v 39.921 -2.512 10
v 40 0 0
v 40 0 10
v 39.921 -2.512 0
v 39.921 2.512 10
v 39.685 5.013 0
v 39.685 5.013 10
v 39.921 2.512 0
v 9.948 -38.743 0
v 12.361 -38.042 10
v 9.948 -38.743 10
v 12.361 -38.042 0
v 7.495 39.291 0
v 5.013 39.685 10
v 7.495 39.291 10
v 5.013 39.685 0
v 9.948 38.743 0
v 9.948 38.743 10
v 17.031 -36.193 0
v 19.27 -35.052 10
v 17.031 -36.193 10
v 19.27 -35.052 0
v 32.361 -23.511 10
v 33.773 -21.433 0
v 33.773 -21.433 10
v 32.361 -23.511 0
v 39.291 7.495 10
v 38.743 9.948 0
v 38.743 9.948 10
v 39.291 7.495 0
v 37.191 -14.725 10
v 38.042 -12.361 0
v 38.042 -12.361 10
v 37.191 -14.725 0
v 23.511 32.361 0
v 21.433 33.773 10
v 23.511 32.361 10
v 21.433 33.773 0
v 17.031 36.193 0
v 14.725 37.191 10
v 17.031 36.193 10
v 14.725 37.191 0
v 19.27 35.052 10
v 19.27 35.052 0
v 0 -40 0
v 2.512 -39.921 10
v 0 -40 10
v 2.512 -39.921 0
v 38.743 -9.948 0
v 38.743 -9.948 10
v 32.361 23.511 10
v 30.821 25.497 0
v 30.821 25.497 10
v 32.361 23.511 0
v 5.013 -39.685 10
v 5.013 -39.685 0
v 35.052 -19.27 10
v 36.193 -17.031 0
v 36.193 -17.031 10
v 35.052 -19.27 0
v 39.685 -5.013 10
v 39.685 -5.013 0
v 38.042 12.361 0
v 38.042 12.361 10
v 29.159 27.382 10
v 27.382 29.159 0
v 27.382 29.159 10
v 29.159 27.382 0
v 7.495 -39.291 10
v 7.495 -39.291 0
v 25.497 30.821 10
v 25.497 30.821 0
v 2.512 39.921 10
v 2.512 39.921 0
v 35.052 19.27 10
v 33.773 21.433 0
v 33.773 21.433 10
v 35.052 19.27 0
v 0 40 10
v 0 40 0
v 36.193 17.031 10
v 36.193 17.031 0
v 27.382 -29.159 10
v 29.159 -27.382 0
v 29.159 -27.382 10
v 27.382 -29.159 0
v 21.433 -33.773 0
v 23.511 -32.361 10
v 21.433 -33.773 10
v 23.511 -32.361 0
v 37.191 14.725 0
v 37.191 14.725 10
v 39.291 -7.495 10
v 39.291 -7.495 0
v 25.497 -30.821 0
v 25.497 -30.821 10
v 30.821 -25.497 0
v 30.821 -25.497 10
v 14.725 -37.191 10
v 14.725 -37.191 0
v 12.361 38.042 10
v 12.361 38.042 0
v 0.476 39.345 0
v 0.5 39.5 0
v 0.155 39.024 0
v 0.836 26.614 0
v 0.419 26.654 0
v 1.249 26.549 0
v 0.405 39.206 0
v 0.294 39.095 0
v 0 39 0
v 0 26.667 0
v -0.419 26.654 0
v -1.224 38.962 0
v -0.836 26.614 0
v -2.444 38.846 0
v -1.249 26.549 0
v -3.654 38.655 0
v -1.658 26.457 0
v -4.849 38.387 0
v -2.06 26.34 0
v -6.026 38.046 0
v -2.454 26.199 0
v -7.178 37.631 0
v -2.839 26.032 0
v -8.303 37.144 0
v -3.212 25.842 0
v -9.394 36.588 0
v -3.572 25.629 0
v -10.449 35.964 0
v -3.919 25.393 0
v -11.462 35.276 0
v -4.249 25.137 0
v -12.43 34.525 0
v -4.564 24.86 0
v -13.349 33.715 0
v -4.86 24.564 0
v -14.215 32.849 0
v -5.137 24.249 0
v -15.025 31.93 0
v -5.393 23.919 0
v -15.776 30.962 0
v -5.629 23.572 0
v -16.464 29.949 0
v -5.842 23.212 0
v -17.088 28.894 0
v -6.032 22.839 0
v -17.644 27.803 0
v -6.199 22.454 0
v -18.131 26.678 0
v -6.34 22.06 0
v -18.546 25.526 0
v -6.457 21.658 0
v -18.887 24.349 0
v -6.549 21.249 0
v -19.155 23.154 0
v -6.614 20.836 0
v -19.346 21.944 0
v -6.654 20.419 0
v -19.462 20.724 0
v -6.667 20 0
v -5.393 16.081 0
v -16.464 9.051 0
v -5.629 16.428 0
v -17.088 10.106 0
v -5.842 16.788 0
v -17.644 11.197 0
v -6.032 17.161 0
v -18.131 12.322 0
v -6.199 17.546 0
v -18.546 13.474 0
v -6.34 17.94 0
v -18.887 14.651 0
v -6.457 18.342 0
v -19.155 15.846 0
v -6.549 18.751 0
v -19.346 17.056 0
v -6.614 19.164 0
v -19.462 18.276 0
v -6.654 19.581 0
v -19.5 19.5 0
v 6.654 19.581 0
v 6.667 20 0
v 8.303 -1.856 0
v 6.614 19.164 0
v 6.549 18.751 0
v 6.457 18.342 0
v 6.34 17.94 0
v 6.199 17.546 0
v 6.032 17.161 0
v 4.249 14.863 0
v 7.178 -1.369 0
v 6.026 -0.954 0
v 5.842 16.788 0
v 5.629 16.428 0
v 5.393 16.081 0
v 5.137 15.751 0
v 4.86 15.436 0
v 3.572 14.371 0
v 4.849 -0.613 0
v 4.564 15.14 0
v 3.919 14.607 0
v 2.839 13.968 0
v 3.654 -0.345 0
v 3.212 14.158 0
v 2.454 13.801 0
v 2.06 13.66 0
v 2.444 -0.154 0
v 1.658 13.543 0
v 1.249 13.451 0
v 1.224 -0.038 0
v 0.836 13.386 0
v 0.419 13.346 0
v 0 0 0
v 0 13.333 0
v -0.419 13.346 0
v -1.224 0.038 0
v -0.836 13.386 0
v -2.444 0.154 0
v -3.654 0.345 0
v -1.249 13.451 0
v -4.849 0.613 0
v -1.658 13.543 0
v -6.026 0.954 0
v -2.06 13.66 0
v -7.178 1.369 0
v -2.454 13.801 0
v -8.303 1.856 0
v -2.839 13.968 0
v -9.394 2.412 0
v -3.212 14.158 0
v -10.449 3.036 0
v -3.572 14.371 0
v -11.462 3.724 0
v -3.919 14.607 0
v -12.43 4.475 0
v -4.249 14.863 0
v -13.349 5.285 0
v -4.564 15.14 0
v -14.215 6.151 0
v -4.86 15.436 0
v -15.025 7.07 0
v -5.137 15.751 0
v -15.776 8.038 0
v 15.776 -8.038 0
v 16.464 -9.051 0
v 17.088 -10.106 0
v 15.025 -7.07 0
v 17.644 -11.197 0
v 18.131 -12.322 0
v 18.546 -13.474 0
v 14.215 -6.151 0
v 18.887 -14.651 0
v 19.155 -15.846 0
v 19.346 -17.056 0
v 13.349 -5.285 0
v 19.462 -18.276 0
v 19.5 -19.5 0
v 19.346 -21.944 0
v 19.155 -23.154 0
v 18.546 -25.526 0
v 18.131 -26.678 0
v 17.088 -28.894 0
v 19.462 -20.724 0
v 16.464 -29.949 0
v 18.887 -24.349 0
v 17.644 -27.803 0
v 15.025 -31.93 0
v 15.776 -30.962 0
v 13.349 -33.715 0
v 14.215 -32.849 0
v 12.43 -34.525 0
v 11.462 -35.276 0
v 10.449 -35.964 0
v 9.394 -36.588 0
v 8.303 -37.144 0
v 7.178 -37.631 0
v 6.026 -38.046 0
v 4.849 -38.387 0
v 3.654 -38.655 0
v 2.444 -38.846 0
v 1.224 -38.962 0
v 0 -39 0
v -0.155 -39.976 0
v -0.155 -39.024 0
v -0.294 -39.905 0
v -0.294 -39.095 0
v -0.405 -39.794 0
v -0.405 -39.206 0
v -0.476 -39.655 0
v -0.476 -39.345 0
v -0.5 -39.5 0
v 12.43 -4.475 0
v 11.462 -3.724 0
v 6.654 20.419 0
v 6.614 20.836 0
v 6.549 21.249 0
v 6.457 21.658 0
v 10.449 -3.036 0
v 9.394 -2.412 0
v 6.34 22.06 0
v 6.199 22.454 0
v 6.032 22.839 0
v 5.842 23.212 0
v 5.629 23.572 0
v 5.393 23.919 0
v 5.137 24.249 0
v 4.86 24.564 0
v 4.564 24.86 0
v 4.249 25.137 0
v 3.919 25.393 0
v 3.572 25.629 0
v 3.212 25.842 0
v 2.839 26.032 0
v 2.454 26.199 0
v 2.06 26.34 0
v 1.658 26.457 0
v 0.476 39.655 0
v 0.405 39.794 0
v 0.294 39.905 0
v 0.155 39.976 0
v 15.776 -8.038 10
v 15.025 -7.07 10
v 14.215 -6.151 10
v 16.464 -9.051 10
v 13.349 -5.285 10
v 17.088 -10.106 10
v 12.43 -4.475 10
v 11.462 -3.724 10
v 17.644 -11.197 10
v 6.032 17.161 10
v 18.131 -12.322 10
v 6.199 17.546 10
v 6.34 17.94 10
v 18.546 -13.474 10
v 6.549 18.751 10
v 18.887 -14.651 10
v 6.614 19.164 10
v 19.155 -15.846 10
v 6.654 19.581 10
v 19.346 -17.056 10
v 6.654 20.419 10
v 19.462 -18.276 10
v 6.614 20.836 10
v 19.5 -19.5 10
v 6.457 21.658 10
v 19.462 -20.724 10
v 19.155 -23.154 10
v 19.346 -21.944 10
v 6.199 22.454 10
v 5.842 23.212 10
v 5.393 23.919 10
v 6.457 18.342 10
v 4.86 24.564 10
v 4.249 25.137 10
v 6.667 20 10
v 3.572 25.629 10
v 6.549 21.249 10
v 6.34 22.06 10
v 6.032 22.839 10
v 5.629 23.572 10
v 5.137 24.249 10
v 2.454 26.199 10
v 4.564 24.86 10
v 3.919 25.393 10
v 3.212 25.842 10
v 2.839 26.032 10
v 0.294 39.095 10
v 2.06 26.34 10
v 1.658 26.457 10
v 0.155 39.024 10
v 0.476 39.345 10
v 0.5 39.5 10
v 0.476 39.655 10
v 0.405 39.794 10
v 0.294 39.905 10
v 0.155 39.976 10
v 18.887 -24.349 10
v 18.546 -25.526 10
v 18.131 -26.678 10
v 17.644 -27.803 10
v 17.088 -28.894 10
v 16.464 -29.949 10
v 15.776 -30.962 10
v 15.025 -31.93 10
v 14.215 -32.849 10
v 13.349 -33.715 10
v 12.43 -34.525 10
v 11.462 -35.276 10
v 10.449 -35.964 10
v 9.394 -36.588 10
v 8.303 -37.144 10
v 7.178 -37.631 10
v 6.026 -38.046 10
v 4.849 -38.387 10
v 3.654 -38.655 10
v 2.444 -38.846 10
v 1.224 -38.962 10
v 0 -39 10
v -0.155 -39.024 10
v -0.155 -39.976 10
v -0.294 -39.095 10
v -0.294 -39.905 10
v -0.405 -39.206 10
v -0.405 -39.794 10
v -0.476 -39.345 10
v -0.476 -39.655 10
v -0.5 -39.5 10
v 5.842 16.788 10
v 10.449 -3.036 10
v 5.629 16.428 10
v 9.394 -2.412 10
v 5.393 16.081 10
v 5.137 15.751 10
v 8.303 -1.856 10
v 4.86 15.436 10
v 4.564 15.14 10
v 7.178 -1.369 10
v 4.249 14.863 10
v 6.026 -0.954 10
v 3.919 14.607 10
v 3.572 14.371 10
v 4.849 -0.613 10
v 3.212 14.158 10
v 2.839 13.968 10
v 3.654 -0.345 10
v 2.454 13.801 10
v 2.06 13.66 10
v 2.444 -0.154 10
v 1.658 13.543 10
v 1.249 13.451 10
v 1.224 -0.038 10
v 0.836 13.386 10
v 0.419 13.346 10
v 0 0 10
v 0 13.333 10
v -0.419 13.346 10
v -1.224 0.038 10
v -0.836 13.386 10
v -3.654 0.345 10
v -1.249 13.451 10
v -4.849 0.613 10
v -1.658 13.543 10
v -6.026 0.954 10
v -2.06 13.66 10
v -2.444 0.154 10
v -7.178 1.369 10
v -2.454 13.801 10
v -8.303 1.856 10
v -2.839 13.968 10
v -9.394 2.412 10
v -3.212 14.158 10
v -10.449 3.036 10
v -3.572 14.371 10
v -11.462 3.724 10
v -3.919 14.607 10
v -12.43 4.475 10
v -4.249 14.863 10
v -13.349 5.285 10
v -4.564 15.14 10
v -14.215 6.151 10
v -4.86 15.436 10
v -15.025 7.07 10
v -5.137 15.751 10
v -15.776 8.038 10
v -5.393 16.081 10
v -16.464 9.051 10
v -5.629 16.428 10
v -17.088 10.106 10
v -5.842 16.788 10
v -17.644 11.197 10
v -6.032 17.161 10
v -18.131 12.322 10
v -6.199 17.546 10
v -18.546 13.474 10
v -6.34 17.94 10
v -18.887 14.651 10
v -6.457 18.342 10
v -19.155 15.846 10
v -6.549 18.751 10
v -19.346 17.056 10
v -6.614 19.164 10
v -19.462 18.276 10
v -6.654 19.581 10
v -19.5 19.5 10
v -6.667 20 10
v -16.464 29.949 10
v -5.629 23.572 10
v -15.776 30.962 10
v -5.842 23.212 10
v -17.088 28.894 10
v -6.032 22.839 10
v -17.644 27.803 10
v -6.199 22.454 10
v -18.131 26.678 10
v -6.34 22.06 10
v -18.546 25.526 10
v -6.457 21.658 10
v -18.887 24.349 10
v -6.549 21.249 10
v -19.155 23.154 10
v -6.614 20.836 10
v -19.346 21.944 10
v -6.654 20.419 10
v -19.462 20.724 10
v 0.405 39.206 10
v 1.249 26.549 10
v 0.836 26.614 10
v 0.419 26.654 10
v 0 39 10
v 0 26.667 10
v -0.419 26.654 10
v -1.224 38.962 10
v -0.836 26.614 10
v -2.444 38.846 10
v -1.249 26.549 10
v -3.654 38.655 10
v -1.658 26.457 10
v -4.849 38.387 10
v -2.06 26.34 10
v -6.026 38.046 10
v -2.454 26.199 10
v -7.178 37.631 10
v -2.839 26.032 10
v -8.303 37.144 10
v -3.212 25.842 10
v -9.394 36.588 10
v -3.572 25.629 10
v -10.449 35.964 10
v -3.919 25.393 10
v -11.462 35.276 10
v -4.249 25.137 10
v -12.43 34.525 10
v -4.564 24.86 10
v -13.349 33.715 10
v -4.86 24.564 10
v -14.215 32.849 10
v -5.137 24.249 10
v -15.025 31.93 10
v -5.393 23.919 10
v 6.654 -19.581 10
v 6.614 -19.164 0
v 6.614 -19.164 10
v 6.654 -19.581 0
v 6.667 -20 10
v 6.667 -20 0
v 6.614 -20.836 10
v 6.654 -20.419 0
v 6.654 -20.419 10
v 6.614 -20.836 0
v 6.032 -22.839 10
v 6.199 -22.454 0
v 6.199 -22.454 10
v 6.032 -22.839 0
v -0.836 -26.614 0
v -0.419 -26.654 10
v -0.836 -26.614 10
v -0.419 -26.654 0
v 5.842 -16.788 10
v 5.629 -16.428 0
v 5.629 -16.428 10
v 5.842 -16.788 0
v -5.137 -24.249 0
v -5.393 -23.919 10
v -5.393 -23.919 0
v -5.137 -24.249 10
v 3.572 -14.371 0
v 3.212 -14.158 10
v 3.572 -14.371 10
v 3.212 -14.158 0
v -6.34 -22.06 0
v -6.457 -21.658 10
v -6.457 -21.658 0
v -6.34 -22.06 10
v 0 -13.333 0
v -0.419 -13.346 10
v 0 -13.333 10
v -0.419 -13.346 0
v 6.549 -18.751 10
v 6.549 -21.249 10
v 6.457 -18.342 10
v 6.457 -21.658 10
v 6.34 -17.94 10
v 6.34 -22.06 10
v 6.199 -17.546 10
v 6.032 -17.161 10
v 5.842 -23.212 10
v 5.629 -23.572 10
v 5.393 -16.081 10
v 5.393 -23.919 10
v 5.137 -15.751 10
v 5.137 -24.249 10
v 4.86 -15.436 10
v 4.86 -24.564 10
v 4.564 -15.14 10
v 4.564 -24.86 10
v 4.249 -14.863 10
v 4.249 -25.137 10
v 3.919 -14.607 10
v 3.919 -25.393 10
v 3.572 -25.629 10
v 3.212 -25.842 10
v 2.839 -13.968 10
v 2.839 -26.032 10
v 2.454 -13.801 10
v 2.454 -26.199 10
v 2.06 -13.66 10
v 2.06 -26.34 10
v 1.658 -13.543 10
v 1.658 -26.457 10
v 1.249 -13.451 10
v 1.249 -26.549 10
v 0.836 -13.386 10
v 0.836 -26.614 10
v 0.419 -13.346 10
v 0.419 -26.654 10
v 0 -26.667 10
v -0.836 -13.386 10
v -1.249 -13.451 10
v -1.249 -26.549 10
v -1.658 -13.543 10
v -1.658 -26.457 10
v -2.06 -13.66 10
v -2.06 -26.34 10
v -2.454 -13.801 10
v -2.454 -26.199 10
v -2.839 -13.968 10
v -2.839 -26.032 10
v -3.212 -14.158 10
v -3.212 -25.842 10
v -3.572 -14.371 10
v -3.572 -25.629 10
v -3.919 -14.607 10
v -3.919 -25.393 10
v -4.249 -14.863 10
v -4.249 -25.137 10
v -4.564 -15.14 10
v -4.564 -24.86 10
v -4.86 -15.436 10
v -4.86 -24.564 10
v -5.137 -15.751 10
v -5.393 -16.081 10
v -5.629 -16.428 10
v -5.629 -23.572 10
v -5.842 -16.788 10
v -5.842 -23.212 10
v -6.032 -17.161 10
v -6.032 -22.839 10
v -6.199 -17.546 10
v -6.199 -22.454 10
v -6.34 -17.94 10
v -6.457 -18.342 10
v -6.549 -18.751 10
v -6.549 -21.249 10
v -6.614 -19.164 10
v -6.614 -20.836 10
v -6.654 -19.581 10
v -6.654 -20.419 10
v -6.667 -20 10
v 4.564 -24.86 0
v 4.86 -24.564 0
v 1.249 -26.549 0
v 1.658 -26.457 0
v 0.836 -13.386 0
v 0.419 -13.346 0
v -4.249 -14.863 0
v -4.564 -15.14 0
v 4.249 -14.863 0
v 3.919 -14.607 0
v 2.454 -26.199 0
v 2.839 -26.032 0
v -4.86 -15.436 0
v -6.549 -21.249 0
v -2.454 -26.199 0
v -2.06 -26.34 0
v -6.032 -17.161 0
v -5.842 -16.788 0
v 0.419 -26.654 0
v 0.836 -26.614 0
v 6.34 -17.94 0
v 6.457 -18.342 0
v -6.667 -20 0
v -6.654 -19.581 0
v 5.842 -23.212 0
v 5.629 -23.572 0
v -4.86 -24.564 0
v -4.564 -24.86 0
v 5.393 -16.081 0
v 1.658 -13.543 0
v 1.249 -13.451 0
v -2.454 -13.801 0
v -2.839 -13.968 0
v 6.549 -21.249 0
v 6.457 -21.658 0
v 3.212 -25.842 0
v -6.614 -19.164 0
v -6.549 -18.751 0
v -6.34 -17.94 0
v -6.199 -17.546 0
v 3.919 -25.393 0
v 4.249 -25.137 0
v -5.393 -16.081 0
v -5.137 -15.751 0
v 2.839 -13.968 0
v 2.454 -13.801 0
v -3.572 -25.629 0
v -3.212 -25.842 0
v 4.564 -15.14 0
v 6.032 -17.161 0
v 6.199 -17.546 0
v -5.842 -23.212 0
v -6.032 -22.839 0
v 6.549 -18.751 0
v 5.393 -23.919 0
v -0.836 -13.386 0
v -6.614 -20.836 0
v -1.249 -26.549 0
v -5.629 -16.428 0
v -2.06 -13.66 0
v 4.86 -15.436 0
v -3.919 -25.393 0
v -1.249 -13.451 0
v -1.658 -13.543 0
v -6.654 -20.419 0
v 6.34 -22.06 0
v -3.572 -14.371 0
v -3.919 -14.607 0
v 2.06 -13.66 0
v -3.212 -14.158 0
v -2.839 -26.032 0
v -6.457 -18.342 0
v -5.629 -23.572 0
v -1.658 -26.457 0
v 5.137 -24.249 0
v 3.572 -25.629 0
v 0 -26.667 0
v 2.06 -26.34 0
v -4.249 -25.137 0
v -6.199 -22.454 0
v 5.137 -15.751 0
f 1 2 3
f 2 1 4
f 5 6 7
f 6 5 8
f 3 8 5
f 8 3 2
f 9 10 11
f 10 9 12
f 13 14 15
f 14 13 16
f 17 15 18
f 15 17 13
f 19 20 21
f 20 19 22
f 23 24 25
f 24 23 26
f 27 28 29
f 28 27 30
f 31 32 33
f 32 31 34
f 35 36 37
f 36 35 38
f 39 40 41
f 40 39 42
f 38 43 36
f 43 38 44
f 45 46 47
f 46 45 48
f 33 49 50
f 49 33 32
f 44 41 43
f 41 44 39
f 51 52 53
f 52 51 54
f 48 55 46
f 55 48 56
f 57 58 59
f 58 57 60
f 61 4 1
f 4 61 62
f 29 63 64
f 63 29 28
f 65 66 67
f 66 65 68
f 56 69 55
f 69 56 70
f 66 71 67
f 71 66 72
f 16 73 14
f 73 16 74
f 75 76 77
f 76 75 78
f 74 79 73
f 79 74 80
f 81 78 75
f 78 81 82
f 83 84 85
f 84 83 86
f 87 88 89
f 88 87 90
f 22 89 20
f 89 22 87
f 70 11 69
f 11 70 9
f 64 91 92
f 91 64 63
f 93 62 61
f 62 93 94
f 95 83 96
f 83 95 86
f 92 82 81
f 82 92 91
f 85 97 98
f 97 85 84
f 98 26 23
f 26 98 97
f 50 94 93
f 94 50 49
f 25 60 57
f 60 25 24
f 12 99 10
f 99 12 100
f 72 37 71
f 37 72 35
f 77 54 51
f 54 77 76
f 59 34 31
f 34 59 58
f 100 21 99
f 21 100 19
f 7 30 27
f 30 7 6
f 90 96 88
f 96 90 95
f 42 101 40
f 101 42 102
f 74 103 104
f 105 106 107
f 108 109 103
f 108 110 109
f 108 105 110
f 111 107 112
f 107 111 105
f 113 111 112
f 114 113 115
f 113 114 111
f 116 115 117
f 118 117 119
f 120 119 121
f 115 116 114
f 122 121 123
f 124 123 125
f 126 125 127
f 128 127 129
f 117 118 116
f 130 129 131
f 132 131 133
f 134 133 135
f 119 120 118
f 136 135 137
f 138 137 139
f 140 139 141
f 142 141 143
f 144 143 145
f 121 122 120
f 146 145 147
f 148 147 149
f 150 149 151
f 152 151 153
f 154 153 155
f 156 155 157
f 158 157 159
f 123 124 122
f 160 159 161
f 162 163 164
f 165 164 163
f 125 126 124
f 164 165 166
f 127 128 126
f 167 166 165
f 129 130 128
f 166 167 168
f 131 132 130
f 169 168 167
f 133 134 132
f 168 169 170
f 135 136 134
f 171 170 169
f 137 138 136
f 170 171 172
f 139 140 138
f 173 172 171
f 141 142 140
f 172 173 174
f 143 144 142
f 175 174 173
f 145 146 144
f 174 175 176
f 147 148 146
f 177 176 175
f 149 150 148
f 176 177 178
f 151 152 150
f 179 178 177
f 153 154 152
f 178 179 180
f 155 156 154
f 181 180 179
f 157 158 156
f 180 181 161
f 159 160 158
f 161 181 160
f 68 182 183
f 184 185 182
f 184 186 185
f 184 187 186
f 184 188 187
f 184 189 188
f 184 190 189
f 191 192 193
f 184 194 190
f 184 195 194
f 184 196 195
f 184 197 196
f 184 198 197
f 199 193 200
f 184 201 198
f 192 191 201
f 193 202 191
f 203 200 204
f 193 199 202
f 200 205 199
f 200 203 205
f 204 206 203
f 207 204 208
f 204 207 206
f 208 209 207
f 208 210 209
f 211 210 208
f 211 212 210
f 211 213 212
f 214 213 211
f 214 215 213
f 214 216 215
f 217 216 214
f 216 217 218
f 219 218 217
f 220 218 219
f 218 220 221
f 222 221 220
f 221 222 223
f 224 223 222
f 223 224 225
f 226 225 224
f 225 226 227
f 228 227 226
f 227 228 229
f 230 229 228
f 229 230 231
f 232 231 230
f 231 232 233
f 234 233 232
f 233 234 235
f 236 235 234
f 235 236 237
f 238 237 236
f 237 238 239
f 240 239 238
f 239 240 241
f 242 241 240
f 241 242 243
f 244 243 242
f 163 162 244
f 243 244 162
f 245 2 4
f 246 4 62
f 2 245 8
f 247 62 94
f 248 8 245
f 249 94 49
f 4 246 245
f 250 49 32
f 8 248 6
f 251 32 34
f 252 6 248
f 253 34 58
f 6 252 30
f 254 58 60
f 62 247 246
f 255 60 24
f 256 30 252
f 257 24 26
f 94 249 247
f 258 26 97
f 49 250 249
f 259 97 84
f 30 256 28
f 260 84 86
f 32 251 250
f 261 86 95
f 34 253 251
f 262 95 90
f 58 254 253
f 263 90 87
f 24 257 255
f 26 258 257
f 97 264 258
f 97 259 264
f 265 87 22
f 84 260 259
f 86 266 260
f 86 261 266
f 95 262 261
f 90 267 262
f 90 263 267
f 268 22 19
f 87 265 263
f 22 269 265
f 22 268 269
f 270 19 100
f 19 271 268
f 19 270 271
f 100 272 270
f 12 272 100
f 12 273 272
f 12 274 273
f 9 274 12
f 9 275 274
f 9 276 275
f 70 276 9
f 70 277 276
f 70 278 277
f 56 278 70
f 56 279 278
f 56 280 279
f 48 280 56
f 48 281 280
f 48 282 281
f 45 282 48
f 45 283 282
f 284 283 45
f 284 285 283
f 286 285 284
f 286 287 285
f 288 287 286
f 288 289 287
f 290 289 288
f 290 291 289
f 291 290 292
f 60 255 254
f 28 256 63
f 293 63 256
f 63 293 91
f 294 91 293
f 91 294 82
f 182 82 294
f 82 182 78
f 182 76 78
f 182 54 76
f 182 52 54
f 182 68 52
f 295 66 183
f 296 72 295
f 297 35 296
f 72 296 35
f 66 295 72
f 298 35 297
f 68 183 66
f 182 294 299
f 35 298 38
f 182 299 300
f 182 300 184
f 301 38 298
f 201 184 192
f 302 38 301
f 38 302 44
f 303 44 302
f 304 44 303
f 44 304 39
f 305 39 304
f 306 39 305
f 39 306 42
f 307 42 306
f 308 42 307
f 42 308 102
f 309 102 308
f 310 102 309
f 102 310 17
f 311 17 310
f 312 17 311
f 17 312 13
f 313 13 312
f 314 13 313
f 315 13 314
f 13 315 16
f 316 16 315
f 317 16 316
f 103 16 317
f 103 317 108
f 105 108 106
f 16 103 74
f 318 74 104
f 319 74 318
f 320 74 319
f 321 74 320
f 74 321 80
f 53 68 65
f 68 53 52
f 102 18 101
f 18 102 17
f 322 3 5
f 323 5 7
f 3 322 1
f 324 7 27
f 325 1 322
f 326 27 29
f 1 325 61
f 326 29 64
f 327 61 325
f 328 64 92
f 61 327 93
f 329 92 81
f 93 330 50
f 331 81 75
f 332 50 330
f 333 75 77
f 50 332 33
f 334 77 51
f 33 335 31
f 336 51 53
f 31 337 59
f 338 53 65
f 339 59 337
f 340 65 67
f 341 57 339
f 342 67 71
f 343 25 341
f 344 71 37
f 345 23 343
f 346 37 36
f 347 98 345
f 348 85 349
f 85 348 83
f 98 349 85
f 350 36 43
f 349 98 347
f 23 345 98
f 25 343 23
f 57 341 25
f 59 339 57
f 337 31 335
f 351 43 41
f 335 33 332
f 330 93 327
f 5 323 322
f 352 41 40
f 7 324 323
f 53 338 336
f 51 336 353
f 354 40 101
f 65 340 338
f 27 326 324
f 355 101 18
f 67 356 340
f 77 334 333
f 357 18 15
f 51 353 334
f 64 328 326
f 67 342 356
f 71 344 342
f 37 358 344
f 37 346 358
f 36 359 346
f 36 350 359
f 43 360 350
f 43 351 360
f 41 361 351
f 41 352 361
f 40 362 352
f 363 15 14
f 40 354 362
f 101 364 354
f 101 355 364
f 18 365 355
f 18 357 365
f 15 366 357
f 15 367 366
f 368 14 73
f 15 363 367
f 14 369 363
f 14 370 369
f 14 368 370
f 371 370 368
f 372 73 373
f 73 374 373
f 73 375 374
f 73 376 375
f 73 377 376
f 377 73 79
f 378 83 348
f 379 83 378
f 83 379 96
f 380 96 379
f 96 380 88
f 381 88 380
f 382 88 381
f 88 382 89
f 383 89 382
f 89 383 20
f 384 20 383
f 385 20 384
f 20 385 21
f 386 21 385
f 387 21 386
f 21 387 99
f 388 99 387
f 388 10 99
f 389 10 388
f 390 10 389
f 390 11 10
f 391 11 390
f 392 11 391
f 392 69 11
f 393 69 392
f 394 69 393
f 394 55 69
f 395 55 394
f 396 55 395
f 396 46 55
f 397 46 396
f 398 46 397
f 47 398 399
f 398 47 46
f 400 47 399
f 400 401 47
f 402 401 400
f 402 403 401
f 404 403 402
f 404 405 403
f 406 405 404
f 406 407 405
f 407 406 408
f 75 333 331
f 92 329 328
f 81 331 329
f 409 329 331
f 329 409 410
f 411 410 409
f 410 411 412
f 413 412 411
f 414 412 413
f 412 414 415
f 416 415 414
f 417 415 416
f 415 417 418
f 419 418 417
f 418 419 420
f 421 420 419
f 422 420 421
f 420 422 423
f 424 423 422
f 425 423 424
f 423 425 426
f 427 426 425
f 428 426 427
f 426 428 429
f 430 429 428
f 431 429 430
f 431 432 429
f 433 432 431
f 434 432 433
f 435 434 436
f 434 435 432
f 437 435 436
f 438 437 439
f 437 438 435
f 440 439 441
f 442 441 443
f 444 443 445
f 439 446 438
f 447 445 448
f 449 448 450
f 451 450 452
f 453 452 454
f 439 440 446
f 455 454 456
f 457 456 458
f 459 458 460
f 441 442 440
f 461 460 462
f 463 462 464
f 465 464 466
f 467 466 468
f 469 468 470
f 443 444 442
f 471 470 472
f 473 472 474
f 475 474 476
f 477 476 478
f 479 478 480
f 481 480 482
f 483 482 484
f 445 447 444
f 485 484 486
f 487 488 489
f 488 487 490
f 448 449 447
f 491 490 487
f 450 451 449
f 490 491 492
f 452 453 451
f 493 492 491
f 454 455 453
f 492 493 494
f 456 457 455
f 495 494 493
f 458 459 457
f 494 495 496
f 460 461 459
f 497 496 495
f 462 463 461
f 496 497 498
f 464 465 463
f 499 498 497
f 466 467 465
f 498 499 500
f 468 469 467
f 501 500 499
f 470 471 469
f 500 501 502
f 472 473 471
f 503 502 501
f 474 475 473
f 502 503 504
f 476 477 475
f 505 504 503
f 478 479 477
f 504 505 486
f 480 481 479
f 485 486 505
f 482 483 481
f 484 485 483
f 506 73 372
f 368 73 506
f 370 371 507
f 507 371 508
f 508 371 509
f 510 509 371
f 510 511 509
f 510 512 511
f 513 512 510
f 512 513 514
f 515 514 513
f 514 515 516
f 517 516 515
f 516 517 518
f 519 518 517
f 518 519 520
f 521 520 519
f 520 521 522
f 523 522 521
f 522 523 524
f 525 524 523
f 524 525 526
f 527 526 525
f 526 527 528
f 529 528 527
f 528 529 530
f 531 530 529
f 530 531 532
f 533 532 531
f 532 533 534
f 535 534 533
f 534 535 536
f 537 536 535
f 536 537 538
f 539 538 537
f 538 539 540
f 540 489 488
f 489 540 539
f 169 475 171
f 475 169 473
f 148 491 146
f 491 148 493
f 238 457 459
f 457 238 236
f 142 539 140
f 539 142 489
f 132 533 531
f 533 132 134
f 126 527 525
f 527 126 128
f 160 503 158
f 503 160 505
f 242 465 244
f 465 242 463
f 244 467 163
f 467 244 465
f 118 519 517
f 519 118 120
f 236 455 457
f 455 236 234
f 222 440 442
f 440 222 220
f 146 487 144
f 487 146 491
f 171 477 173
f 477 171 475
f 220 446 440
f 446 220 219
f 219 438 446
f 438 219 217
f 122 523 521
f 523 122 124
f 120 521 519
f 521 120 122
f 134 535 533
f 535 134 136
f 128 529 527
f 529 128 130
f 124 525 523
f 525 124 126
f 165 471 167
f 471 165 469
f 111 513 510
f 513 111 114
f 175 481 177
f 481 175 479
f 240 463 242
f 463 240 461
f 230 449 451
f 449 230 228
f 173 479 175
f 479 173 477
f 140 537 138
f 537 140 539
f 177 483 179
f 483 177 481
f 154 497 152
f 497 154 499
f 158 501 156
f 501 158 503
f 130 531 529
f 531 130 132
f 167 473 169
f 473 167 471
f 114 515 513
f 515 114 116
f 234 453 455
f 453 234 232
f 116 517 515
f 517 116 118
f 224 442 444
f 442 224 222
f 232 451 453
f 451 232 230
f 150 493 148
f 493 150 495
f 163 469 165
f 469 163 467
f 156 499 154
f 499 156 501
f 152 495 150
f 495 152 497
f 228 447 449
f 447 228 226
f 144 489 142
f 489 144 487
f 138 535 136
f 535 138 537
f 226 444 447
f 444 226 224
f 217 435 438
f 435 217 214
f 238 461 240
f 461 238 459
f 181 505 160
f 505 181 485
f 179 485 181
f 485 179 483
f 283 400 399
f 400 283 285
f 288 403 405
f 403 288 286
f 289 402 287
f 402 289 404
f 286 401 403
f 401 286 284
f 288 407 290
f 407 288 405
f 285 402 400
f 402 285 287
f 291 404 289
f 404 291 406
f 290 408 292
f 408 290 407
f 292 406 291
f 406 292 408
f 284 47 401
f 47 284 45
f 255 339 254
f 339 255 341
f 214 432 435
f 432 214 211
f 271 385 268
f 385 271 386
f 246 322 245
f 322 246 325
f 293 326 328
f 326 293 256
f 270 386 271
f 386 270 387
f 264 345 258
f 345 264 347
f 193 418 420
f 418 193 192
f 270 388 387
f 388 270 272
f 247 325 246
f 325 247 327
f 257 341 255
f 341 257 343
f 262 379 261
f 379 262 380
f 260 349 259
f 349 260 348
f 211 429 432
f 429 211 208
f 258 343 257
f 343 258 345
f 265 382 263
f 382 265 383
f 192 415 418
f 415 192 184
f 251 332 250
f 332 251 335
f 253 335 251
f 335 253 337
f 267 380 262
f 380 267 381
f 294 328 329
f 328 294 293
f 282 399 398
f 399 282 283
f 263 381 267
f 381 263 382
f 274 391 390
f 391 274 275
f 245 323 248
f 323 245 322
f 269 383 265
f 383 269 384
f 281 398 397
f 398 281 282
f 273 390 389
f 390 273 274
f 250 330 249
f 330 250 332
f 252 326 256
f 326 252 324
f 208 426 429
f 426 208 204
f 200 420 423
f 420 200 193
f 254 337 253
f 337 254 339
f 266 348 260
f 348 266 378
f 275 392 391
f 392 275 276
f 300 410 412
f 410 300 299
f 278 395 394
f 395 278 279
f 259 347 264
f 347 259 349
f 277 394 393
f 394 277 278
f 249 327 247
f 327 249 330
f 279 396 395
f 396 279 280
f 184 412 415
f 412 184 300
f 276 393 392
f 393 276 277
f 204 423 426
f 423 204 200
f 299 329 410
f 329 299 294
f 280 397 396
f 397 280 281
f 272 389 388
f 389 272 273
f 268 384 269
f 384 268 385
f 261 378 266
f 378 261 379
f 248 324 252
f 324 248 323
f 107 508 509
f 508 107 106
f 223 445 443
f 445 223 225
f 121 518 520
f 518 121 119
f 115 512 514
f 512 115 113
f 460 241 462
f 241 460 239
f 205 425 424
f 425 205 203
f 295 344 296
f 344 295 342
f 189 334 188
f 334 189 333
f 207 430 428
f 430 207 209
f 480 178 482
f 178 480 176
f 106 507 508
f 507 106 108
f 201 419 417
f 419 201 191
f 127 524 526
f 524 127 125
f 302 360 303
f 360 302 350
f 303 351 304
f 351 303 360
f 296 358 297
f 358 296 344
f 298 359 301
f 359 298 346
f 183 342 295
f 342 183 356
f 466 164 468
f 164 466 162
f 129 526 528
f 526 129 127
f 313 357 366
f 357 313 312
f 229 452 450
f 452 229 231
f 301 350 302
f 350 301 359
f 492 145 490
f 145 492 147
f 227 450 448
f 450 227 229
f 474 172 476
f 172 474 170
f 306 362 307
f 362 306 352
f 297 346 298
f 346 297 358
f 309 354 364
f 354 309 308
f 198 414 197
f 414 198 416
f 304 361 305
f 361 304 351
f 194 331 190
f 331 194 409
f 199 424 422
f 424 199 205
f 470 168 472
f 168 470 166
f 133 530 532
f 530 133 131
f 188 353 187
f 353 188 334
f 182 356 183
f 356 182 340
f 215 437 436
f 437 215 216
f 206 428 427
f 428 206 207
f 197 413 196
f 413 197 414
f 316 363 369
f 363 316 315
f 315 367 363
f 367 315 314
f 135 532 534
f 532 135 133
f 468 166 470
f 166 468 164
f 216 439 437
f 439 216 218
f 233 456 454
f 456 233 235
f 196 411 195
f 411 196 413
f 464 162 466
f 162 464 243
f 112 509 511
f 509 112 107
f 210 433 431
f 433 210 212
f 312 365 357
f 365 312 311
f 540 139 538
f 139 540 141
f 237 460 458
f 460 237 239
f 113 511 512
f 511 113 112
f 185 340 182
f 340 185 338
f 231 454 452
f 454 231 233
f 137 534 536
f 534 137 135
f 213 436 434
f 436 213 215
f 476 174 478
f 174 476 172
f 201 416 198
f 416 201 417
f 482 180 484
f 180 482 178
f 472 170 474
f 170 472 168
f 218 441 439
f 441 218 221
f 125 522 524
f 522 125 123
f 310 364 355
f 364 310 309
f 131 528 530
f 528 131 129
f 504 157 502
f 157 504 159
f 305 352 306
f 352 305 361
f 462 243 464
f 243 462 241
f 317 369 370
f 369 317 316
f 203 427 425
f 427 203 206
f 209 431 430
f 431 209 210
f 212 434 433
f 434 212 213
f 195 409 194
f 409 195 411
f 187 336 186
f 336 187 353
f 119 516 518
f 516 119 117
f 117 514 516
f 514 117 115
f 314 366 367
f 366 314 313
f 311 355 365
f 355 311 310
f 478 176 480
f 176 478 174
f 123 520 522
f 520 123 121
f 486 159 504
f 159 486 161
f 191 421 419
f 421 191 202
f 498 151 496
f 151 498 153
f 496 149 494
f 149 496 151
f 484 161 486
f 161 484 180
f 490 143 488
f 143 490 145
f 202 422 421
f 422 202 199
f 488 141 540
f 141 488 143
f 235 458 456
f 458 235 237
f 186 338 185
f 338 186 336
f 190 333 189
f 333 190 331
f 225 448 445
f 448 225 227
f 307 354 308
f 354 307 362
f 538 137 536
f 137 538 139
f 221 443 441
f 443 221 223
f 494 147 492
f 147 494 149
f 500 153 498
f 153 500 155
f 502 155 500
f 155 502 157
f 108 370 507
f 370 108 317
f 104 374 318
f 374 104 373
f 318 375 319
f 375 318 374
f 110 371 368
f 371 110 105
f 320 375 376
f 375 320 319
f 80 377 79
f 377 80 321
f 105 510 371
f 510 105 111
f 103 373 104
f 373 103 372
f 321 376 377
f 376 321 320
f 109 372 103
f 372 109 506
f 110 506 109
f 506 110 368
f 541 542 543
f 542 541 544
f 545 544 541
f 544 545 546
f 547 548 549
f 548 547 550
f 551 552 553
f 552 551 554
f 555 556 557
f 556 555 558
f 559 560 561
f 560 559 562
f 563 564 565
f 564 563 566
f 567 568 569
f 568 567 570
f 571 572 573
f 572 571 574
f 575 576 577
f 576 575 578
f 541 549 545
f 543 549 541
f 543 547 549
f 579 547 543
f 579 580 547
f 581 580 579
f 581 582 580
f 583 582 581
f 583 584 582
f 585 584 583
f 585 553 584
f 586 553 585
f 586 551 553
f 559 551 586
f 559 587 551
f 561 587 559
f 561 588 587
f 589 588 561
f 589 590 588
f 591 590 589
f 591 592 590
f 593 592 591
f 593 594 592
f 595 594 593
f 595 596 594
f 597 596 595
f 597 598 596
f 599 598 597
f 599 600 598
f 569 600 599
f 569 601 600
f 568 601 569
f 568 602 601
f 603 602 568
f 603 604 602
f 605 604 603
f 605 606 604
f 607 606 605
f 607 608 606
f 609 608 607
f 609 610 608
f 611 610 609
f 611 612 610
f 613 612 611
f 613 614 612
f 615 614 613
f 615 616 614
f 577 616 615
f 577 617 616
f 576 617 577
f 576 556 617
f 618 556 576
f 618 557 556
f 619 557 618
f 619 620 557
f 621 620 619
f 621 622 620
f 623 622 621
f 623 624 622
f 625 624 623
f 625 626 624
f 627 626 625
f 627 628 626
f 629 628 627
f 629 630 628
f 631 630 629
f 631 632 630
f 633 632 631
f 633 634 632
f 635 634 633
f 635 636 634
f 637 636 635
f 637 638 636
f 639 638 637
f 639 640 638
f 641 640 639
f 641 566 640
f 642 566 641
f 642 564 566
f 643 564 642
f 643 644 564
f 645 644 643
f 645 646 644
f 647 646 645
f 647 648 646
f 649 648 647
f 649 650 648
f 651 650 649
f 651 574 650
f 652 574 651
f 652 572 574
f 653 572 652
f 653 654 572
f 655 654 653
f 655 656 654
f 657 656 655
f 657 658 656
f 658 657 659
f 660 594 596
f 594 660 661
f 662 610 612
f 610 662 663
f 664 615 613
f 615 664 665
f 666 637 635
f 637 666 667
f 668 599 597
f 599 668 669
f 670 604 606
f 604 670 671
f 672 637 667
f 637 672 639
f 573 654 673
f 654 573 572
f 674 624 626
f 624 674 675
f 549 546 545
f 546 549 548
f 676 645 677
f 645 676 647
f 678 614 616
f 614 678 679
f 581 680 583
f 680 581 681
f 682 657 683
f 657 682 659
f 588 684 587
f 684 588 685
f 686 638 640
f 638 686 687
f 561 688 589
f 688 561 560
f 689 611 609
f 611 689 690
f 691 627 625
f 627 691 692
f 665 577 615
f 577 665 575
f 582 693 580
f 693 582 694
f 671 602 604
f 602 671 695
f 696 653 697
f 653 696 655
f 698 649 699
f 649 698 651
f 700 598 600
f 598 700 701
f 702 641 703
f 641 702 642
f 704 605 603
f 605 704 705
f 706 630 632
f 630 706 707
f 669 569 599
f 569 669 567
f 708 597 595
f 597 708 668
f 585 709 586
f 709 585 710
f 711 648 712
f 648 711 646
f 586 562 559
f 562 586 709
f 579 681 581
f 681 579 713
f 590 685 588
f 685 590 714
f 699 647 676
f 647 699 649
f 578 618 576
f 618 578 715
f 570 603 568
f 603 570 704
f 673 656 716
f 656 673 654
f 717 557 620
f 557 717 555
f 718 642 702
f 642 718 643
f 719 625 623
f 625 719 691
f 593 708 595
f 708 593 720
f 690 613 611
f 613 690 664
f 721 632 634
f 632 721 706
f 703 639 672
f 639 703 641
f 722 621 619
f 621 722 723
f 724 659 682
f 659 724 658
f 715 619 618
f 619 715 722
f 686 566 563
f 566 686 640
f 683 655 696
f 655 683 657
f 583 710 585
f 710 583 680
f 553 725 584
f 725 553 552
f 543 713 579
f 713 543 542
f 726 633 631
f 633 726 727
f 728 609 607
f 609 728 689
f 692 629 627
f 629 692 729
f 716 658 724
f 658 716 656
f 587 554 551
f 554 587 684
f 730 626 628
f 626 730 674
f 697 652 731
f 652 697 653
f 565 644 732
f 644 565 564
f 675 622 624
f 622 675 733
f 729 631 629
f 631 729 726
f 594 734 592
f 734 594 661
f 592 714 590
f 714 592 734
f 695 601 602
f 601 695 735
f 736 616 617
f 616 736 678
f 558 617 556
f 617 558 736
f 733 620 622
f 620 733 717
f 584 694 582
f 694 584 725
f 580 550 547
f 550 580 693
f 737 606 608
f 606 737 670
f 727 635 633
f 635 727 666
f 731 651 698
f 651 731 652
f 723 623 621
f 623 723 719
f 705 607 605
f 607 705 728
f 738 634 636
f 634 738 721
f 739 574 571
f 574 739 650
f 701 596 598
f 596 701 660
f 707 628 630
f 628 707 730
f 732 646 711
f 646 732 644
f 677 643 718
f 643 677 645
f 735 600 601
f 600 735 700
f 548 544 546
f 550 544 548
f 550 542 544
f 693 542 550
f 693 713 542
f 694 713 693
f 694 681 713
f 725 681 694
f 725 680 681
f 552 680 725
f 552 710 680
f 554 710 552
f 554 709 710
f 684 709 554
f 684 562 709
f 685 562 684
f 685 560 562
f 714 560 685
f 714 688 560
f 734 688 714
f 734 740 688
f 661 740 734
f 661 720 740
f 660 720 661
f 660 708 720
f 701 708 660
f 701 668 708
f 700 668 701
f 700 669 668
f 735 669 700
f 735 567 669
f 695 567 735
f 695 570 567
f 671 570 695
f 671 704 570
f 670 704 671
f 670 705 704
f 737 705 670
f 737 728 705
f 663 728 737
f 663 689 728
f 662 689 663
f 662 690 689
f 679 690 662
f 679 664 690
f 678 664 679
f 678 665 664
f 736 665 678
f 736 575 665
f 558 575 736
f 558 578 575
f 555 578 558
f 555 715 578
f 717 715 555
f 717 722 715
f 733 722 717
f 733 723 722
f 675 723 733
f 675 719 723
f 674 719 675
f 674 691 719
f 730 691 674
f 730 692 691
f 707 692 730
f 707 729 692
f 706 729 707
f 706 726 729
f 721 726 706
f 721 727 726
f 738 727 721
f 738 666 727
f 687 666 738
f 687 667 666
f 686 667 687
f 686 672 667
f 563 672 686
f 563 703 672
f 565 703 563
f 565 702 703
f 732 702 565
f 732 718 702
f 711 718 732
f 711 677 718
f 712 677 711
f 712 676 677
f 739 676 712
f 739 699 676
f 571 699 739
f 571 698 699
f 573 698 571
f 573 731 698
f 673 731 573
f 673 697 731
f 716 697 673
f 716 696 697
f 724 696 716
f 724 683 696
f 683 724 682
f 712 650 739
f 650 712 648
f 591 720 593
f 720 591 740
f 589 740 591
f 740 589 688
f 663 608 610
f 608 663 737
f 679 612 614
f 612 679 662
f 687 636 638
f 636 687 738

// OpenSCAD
module _yingyang() {
    d = 80;
    h = 10;
    difference() {
        union() {
            intersection() {
                cylinder(d=d,h=h,$fn=100);
                translate([0,-100,0]) cube([100,200,11]);
            }
            translate([0,d/4-1/2,0]) cylinder(d=d/2-1,h=h,$fn=100);
            translate([0,-d/2+0.5]) cylinder(d=1,h=h,$fn=20);
        }
        translate([0,-d/4+1/2,-0.1]) cylinder(d=d/2-1,h=h+1,$fn=100);
        translate([0,d/4,-0.1]) cylinder(d=d/6,h=h+1,$fn=100);
        translate([0,d/2-0.5]) cylinder(d=1,h=h,$fn=20);
    }
    translate([0,-d/4,0]) cylinder(d=d/6,h=h,$fn=100);
}

module ying() {
    _yingyang();
}

module yang() {
    rotate([0,0,180]) _yingyang();
}

ying();
//yang();
